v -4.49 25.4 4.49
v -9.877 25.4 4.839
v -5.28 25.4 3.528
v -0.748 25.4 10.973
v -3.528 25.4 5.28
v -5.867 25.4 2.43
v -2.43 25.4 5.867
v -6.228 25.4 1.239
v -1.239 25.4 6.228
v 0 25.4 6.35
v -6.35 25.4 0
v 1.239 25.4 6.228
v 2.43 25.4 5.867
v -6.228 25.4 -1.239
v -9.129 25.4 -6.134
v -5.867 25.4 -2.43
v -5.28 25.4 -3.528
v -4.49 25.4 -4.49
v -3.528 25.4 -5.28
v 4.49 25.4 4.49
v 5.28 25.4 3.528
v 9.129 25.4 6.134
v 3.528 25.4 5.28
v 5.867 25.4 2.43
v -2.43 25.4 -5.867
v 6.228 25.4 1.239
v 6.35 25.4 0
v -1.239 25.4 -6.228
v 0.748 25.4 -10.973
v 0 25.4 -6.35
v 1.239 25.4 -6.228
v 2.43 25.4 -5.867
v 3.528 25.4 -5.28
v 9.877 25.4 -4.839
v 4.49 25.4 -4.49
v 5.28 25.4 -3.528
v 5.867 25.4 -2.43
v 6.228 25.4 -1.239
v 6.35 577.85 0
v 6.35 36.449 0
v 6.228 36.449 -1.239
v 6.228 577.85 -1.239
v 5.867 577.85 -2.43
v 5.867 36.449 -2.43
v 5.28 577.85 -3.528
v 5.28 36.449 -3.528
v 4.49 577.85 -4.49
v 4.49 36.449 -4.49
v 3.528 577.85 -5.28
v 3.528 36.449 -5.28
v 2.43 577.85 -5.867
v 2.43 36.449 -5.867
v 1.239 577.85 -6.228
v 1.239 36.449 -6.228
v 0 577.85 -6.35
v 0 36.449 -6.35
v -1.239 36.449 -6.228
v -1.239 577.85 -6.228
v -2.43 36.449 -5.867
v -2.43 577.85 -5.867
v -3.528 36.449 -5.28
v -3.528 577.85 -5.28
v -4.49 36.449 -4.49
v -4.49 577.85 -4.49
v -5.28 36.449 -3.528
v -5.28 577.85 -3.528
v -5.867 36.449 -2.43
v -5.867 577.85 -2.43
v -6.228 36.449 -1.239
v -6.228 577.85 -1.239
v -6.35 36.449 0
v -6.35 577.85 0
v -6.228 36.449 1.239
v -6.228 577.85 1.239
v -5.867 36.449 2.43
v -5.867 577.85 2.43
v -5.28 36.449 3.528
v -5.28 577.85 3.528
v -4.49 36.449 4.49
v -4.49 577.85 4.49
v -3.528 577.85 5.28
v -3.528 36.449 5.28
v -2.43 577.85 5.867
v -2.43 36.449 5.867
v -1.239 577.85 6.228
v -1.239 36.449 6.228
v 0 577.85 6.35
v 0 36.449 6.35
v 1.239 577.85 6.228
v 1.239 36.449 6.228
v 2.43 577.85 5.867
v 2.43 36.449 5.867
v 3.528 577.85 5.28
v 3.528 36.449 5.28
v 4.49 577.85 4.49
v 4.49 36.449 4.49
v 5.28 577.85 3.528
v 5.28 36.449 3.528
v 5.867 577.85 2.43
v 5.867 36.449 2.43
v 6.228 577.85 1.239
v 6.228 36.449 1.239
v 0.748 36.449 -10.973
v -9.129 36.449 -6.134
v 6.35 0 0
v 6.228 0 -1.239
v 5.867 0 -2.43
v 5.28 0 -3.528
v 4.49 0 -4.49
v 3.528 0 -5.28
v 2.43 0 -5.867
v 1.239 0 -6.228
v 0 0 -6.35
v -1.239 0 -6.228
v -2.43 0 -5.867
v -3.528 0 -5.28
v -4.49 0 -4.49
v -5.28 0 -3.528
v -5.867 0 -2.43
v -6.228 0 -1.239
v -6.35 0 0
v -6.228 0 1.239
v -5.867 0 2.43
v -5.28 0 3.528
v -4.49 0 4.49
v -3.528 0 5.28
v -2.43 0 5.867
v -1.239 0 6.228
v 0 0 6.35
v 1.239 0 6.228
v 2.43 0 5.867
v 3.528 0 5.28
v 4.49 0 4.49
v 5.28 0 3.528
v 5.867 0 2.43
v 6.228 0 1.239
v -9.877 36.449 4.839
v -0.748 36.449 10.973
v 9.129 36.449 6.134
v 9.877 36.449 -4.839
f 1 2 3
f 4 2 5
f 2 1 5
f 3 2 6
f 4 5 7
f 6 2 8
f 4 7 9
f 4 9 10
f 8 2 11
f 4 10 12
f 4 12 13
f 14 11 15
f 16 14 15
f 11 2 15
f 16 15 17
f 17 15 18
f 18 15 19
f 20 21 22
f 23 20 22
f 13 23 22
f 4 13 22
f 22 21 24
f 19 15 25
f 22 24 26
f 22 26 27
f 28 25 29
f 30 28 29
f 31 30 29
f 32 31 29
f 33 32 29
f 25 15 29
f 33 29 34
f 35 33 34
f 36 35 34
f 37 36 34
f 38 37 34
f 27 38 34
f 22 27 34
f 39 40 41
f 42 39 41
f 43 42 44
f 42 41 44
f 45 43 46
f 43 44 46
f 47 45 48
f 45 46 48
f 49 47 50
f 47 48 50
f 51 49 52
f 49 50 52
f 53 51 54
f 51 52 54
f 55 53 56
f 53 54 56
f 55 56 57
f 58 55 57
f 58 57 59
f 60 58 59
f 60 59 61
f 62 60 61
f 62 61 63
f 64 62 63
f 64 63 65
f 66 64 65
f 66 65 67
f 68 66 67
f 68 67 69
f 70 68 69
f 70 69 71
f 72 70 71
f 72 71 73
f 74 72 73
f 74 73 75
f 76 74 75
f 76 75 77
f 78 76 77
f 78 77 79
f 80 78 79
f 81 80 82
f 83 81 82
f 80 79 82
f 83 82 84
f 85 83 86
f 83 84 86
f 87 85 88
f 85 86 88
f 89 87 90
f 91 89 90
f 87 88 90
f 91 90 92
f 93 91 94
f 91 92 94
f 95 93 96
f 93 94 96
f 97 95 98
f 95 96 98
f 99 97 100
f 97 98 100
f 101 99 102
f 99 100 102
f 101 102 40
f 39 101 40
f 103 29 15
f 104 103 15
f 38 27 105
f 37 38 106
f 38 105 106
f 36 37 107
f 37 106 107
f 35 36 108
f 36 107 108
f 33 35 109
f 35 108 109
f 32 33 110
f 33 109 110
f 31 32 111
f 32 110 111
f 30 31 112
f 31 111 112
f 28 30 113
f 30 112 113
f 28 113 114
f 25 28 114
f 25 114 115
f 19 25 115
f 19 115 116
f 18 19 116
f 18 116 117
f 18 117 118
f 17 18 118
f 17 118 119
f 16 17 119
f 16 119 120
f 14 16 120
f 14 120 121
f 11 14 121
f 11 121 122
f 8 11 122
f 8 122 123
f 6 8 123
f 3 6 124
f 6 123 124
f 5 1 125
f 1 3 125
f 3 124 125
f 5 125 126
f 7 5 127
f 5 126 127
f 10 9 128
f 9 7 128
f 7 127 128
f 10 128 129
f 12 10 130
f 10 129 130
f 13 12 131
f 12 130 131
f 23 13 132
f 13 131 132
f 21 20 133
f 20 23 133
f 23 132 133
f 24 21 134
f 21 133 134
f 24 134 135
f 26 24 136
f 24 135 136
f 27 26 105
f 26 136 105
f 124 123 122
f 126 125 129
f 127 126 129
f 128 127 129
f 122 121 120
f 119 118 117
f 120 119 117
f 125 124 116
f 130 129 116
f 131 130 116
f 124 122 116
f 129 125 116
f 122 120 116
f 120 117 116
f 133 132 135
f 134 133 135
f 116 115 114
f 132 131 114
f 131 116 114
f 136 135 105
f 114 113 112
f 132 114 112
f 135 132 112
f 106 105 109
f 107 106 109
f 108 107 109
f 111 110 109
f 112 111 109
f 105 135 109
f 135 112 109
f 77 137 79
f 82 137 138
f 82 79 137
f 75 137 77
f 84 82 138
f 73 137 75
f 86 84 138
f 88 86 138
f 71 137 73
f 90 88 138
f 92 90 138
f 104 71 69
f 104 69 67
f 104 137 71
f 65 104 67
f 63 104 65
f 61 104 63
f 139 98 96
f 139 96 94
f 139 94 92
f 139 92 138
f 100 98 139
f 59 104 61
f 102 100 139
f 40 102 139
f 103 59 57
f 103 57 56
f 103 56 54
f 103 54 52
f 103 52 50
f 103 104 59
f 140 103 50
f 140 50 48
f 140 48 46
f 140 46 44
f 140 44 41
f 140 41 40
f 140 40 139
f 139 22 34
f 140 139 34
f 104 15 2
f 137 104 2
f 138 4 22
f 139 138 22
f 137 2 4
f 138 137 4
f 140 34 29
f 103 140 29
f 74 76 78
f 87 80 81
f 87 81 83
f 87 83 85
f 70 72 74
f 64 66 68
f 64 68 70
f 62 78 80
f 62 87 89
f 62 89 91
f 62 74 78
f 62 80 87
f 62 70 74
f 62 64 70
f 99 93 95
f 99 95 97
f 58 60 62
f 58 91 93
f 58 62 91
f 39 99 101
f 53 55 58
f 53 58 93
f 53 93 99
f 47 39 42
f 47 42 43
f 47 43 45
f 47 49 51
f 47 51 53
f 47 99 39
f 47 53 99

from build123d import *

# Parameters (mm, degrees)
SKETCH1_R           = 6.35
BOSS_EXTRUDE1_DEPTH = 577.85
BOSS_EXTRUDE2_START = 25.4
BOSS_EXTRUDE2_DEPTH = 11.049


with BuildPart() as part:
    # Sketch1 → Boss-Extrude1 (new body)
    with BuildSketch(Plane(origin=(0, 0, 0), x_dir=(1, 0, 0), z_dir=(0, 1, 0))):
        Circle(SKETCH1_R)
    extrude(amount=BOSS_EXTRUDE1_DEPTH)

    # Sketch3 → Boss-Extrude2 (add)
    with BuildSketch(Plane(origin=(0, 0, 0), x_dir=(1, 0, 0), z_dir=(0, 1, 0)).offset(BOSS_EXTRUDE2_START)):
        Polygon((9.876865428, 4.838907863), (0.747815578, 10.973070302), (-9.129049851, 6.134162439), (-9.876865428, -4.838907863), (-0.747815578, -10.973070302), (9.129049851, -6.134162439), align=None)
    extrude(amount=BOSS_EXTRUDE2_DEPTH)


solid = part.part
